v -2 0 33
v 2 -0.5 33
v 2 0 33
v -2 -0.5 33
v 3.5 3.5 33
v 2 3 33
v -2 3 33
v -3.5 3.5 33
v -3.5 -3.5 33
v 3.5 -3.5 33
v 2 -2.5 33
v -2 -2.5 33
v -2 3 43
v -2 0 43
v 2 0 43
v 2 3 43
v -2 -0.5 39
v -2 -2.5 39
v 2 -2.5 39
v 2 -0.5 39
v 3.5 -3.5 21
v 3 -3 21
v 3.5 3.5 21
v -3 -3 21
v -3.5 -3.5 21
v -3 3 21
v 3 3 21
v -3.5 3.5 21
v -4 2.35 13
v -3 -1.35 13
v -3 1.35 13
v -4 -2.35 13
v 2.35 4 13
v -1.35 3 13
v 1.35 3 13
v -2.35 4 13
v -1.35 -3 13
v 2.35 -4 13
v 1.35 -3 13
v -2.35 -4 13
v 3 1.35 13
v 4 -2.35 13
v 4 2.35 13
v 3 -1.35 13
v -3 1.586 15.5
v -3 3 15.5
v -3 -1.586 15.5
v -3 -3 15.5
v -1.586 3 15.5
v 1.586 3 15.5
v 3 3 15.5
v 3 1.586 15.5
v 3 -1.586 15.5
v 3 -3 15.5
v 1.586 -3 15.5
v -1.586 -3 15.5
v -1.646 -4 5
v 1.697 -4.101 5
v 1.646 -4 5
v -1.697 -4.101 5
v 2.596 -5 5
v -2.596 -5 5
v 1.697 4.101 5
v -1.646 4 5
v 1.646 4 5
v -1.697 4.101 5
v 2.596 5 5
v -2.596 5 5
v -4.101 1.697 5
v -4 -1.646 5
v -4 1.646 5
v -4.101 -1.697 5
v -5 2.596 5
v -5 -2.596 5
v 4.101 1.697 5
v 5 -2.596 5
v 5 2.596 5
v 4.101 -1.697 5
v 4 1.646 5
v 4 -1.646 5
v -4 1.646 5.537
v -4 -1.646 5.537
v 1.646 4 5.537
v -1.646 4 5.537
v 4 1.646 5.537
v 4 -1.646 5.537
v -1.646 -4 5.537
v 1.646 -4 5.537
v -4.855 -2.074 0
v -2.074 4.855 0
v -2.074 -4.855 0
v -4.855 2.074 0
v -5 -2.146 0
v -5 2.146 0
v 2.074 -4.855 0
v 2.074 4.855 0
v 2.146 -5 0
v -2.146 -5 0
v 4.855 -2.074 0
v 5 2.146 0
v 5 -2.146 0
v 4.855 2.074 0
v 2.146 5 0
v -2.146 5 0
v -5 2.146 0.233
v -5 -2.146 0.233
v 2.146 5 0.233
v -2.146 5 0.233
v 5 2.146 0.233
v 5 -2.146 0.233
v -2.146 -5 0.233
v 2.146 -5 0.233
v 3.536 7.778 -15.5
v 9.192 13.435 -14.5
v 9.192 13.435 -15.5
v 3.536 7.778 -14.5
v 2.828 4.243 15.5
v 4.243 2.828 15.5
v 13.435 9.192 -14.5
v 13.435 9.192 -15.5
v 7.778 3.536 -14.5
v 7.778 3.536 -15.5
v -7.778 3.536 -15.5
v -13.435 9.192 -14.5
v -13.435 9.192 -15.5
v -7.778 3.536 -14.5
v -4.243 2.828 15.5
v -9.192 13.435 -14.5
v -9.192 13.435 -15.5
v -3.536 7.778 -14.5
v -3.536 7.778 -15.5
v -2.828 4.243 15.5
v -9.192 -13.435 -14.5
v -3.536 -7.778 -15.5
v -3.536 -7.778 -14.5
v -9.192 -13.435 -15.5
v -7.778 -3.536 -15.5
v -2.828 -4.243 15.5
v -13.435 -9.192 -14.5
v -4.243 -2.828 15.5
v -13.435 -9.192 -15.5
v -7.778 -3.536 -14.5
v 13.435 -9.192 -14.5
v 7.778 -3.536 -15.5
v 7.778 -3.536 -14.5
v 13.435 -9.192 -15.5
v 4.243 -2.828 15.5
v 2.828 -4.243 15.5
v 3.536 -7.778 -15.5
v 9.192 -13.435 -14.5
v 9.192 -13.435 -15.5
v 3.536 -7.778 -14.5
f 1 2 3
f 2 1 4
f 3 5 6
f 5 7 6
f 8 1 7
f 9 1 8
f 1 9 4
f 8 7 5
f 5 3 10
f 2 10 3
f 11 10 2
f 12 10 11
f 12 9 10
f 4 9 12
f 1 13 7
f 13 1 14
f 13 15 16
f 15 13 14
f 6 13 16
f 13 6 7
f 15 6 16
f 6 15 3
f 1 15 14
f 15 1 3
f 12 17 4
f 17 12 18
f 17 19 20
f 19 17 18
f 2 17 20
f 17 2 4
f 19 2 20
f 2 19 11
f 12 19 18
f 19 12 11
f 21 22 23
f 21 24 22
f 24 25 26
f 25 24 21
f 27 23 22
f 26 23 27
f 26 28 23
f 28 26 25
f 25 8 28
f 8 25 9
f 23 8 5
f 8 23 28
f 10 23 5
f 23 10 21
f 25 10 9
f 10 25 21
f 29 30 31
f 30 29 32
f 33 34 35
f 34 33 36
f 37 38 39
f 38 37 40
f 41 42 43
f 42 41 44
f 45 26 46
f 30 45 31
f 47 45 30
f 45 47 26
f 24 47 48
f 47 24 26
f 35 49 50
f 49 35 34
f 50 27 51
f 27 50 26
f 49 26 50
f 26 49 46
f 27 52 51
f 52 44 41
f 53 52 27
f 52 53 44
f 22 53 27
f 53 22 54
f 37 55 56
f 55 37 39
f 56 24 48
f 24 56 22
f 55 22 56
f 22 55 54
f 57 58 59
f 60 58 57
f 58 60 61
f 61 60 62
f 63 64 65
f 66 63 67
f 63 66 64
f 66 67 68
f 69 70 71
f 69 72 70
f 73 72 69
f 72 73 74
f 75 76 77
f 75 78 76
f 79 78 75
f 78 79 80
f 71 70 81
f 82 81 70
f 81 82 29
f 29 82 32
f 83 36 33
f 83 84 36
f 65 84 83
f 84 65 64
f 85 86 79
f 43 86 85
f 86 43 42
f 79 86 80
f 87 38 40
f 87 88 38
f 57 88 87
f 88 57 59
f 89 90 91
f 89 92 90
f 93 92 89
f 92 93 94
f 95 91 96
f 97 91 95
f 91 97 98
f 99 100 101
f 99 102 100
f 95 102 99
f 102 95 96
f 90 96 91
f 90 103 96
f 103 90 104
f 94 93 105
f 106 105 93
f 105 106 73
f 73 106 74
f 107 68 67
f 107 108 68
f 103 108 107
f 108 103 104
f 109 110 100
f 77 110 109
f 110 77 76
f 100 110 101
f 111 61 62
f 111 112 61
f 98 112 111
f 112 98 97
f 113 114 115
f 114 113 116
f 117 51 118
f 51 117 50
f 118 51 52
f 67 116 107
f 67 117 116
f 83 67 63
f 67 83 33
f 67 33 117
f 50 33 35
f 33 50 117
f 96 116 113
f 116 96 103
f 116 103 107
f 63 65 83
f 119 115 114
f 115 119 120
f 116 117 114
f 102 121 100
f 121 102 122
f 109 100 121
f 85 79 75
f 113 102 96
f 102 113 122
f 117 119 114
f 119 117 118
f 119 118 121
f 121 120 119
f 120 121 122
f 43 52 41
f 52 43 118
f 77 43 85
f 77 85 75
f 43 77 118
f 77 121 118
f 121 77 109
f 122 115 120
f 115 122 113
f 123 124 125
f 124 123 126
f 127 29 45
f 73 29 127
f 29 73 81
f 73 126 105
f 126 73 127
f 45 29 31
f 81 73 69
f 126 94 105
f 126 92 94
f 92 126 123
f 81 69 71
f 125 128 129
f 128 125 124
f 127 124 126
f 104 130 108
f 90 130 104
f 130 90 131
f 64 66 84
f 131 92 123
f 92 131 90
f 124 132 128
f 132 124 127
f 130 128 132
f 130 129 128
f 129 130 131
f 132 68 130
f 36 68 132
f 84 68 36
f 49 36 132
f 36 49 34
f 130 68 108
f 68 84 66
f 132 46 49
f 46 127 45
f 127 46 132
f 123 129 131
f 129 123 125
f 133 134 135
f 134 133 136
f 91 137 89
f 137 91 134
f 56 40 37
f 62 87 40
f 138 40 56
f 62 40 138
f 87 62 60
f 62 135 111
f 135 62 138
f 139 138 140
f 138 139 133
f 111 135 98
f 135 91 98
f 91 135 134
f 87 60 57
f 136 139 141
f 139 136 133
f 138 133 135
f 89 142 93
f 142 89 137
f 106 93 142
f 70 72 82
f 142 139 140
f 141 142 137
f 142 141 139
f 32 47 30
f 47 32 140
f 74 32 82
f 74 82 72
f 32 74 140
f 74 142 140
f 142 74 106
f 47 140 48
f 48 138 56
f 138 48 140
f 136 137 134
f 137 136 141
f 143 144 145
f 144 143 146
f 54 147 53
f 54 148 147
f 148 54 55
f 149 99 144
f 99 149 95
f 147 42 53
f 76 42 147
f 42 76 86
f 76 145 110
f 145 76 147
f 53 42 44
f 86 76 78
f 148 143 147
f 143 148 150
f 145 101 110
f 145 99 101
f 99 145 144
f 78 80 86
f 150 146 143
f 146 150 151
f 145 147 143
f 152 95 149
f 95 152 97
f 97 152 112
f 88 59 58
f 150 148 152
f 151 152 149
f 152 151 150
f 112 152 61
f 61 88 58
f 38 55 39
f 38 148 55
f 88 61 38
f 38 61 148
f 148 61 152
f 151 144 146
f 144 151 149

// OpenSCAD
$fa=1;
$fs=0.1;

module ship_hull() {
    // upper torpedo assembly
    translate([0,1.5,33]) linear_extrude(height = 10) square(size = [ 4, 3 ], center = true);

    // lower torpedo assembly
    translate([0,-1.5,33]) linear_extrude(height = 6) square(size = [ 4, 2 ], center = true);

    // stage 3
    translate([0,0,21]) linear_extrude(height = 12) square(size = 7, center = true);

    // stage 2
    translate([0,0,13]) linear_extrude(height = 8) square(size = 6, center = true);

    // stage 1
    translate([0,0,5]) linear_extrude(height = 8) square(size = 8, center = true);

    // stage 0
    linear_extrude(height = 5)  square(size = 10, center = true);
}
// ship_hull();

module ship_engine() {
    // polygon(
    //     points = [[0,0], [0,1], [1,1]],
    //     paths = [[0,1,2]]
    // );

    hull() {
        // top
        translate([1.5,0,30]) cube(size = [3,2,1], center = true);


        // bottom
        translate([10,0,0]) cube(size = [8,6,1], center = true);
    }

}
// ship_engine();


ship_hull();

for (angle = [45:90:359]) {
    dx = 2 * cos(angle);
    dy = 2 * sin(angle);

    translate([ dx,dy, -15 ])  rotate([0,0,angle]) ship_engine();
}
